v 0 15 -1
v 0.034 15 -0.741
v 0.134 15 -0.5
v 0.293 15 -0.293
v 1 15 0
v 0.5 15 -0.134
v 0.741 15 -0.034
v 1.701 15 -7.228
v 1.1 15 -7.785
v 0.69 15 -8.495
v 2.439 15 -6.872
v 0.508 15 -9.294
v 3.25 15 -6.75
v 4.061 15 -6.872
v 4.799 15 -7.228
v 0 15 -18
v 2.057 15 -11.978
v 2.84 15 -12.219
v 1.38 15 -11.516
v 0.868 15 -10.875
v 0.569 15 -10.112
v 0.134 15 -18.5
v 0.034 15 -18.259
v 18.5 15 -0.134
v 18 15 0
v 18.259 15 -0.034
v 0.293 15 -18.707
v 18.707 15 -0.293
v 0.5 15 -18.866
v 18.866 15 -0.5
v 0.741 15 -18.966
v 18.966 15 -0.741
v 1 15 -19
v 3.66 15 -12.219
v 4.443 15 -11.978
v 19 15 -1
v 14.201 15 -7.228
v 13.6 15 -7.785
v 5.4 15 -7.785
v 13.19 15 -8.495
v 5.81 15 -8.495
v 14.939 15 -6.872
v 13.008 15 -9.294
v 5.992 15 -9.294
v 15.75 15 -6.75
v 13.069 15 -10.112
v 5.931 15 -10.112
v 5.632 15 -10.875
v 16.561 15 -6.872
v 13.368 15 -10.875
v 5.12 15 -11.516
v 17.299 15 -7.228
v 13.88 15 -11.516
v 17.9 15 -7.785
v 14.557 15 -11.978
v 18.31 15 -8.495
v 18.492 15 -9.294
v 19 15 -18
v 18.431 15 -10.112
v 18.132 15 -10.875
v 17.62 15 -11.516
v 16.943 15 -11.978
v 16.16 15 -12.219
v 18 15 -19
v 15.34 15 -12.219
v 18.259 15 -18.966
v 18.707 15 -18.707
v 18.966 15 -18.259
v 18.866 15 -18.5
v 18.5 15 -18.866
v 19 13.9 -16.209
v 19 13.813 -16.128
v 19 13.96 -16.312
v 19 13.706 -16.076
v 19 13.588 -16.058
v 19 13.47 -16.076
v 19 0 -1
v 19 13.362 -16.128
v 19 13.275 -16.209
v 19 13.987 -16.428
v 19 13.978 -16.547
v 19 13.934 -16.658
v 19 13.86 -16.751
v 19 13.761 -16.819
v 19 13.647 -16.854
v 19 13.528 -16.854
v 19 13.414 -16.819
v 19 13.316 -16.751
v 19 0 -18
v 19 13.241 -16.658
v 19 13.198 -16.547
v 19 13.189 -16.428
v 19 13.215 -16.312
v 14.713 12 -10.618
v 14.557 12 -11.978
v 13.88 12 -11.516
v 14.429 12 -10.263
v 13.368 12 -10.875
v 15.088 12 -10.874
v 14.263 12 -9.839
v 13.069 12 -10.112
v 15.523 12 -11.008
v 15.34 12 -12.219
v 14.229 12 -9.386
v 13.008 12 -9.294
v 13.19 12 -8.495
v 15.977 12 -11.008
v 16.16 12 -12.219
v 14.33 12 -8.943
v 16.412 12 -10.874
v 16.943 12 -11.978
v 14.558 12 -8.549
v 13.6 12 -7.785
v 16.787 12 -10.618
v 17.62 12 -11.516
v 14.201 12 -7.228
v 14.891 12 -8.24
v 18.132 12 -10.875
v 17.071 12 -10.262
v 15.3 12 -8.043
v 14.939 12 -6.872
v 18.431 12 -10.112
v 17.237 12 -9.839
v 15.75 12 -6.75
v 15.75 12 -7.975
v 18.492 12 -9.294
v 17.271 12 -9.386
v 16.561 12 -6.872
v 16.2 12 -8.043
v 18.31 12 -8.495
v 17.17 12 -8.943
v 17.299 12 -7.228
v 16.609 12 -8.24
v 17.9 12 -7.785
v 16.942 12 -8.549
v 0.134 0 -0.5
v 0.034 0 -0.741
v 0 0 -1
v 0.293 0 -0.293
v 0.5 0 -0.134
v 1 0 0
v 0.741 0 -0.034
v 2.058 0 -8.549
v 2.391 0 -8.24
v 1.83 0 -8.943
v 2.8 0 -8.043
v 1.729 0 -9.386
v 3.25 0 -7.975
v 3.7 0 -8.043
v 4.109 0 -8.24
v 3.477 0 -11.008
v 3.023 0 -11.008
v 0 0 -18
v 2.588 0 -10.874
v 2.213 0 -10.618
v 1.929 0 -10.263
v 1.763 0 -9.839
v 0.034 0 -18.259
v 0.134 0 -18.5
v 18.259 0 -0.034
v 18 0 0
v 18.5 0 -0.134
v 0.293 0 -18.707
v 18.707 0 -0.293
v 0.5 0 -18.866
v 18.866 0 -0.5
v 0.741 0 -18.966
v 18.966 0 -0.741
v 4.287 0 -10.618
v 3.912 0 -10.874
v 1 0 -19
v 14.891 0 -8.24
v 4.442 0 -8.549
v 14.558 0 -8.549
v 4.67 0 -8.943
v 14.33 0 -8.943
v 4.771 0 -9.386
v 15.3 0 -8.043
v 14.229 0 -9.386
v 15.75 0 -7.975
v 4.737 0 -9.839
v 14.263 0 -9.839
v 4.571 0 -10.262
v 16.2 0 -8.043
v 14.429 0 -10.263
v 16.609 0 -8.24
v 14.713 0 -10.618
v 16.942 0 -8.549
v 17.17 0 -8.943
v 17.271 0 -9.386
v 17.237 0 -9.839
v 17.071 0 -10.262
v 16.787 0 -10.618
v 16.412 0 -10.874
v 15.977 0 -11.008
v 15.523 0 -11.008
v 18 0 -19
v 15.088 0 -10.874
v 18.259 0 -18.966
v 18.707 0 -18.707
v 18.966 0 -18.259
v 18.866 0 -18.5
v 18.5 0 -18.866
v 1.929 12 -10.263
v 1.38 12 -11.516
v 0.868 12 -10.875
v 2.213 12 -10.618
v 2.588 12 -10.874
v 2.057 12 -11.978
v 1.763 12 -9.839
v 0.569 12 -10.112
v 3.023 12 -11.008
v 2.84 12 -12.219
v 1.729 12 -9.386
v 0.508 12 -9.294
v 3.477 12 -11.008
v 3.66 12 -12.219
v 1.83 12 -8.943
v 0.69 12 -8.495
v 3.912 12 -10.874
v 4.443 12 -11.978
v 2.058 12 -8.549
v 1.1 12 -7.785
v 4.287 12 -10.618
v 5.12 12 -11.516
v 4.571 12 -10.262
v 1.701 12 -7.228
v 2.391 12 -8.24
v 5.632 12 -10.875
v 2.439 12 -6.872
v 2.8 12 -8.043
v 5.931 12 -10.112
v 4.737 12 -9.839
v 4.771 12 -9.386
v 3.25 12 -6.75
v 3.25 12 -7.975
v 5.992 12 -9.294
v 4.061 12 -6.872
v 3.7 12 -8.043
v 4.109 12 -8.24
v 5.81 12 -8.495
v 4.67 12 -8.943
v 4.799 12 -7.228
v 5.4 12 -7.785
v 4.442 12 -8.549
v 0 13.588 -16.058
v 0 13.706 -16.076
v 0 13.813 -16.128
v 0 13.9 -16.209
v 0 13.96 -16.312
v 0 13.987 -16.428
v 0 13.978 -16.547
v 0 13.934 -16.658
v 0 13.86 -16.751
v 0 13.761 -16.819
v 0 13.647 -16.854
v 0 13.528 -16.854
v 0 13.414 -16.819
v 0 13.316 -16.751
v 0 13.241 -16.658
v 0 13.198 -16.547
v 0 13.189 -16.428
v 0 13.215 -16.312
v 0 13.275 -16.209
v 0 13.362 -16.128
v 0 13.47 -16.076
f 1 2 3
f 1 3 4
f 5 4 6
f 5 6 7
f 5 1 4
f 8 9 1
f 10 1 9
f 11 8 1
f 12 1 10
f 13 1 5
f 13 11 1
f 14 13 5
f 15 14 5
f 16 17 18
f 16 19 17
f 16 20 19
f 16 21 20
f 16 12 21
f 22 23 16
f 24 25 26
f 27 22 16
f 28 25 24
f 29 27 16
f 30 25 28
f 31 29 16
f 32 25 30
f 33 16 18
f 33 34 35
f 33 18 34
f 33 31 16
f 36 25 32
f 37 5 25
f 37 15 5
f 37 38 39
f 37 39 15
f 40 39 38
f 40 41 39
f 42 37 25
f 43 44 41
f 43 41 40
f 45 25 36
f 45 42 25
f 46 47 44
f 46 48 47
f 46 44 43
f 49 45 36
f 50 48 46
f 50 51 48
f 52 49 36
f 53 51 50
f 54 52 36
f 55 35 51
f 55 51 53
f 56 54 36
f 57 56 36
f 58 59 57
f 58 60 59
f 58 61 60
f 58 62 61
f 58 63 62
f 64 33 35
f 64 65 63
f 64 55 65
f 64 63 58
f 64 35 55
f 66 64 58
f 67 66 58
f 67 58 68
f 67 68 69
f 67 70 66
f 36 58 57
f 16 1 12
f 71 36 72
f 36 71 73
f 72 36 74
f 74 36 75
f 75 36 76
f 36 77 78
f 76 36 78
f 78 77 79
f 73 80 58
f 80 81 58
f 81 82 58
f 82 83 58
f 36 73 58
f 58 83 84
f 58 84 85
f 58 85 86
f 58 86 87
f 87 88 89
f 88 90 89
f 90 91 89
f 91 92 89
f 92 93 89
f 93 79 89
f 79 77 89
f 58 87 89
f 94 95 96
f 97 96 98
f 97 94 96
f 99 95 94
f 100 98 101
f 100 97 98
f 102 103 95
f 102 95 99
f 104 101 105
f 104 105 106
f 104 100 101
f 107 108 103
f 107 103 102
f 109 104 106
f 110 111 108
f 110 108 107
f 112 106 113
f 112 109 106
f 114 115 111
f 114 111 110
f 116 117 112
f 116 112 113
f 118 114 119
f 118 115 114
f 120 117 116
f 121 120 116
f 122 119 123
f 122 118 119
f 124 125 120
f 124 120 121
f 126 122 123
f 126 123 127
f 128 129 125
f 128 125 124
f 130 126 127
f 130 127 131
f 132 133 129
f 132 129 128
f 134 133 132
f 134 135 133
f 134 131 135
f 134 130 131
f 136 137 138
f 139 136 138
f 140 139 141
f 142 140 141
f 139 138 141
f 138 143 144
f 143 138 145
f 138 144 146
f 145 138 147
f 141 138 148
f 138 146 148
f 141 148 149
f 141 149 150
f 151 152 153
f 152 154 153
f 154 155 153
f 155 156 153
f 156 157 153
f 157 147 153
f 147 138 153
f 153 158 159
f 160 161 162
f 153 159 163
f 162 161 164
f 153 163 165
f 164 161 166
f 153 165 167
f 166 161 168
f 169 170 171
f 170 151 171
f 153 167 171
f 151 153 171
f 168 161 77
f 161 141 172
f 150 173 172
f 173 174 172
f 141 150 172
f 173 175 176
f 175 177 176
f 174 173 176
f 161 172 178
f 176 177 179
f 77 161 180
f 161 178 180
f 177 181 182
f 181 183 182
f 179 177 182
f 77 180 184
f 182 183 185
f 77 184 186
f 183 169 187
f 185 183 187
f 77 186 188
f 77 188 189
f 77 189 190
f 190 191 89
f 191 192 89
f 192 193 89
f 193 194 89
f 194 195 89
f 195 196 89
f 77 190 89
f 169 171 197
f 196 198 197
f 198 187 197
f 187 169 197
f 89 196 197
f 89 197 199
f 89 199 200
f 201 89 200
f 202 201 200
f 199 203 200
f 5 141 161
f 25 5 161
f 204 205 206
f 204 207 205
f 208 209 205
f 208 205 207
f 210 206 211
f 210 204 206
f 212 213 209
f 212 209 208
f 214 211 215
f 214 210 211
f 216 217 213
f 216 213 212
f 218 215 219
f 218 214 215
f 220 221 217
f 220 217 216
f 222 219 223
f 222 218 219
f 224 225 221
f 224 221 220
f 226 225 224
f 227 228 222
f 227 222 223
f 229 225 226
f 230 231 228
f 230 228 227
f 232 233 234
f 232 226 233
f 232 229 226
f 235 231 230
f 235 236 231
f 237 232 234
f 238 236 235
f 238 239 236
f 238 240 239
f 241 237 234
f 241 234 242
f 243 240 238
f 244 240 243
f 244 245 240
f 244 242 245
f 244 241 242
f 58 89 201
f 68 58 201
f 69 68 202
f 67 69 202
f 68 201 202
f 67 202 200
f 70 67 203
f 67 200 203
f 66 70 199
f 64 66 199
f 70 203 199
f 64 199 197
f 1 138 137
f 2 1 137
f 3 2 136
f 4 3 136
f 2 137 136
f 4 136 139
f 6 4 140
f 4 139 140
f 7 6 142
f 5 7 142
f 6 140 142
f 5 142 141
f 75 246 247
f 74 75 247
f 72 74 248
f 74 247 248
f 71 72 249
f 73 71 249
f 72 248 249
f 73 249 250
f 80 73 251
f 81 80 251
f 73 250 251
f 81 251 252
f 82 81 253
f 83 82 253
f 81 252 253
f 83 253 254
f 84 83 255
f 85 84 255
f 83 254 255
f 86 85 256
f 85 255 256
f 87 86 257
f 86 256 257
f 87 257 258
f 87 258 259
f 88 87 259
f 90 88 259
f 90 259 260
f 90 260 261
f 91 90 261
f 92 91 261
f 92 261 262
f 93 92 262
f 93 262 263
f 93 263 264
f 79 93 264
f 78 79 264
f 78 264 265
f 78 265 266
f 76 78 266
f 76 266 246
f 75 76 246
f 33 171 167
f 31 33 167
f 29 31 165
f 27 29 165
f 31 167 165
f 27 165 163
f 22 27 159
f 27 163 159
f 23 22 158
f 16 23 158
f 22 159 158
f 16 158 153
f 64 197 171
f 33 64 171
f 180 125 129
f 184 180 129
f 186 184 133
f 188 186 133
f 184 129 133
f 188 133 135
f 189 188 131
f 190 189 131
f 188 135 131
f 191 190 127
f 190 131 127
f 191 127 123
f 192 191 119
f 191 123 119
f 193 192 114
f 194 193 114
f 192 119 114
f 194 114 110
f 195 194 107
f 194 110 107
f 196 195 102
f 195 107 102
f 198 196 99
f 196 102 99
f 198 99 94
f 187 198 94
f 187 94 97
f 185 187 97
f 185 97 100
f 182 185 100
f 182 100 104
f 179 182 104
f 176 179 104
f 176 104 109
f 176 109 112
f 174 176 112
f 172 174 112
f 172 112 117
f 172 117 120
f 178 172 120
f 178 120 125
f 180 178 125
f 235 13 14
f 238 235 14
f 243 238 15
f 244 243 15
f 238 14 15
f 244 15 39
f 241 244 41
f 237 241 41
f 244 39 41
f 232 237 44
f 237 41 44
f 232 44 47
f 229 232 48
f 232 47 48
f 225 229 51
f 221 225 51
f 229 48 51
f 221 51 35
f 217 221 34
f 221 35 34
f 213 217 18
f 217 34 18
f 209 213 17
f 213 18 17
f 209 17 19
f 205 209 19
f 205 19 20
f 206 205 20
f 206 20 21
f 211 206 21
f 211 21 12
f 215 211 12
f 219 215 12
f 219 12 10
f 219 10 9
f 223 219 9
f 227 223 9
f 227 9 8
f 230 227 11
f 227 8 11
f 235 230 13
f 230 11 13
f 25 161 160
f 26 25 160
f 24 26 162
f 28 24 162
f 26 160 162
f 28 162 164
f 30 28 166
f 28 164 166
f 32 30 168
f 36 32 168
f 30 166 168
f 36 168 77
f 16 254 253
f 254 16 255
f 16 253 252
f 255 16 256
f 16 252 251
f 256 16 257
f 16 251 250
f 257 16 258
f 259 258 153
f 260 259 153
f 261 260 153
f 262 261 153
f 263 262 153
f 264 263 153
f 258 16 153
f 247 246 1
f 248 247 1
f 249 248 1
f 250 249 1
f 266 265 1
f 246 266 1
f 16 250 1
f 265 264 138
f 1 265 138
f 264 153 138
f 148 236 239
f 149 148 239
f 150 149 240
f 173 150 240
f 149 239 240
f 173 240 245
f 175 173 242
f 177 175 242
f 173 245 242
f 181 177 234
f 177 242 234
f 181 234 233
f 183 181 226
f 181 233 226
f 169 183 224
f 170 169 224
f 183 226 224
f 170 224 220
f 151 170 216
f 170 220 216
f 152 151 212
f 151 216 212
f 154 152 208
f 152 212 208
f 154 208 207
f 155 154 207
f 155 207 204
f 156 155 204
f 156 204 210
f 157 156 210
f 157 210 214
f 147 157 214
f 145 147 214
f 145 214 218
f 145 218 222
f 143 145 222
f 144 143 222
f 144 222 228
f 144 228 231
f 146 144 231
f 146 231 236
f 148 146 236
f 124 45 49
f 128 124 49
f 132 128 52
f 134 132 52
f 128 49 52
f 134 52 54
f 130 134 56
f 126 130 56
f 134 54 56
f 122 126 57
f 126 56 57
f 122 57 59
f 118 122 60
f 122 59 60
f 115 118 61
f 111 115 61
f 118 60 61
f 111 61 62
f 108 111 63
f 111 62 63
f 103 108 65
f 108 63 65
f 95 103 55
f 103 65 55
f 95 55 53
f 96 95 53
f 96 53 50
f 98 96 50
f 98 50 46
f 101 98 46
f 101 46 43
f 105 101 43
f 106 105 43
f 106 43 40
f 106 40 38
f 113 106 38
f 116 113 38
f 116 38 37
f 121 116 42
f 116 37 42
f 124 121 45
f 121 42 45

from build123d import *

# Parameters (mm, degrees)
BOSS_EXTRUDE1_DEPTH = 15
CUT_EXTRUDE1_REACH  = 32.773
SKETCH2_R           = 1.525
SKETCH3_R           = 2.75
CUT_EXTRUDE2_DEPTH  = 3
CUT_EXTRUDE3_REACH  = 32.773
SKETCH4_R           = 0.4


with BuildPart() as part:
    # Sketch1 → Boss-Extrude1 (new body)
    with BuildSketch(Plane(origin=(0, 0, 0), x_dir=(1, 0, 0), z_dir=(0, 1, 0))):
        with BuildLine():
            Line((1, 0), (18, 0))
            ThreePointArc((18, 0), (18.707106781, 0.292893219), (19, 1))
            Line((19, 1), (19, 18))
            ThreePointArc((19, 18), (18.707106781, 18.707106781), (18, 19))
            Line((18, 19), (1, 19))
            ThreePointArc((1, 19), (0.292893219, 18.707106781), (0, 18))
            Line((0, 18), (0, 1))
            ThreePointArc((0, 1), (0.292893219, 0.292893219), (1, 0))
        make_face()
    extrude(amount=BOSS_EXTRUDE1_DEPTH)

    # Sketch2 → Cut-Extrude1 (cut, up to next)
    with BuildSketch(Plane(origin=(0, 15, 0), x_dir=(1, 0, 0), z_dir=(0, 1, 0)), mode=Mode.PRIVATE) as cut_extrude1_sk1:
        with Locations(Location((3.25, 9.5, 0), (0, 0, 270))):
            Circle(SKETCH2_R)
    cut_extrude1_tool1 = extrude(cut_extrude1_sk1.sketch, amount=-CUT_EXTRUDE1_REACH, mode=Mode.PRIVATE) & part.part
    # Sketch2 → Cut-Extrude1 (cut, up to next)
    with BuildSketch(Plane(origin=(0, 15, 0), x_dir=(1, 0, 0), z_dir=(0, 1, 0)), mode=Mode.PRIVATE) as cut_extrude1_sk2:
        with Locations(Location((15.75, 9.5, 0), (0, 0, 270))):
            Circle(SKETCH2_R)
    cut_extrude1_tool2 = extrude(cut_extrude1_sk2.sketch, amount=-CUT_EXTRUDE1_REACH, mode=Mode.PRIVATE) & part.part
    add(cut_extrude1_tool1.solids().sort_by_distance((3.25, 15, -9.5))[0], mode=Mode.SUBTRACT)
    add(cut_extrude1_tool2.solids().sort_by_distance((15.75, 15, -9.5))[0], mode=Mode.SUBTRACT)

    # Sketch3 → Cut-Extrude2 (cut)
    with BuildSketch(Plane(origin=(0, 15, 0), x_dir=(1, 0, 0), z_dir=(0, 1, 0))):
        with Locations(Location((3.25, 9.5, 0), (0, 0, 270))):
            Circle(SKETCH3_R)
        with Locations(Location((15.75, 9.5, 0), (0, 0, 270))):
            Circle(SKETCH3_R)
    extrude(amount=-CUT_EXTRUDE2_DEPTH, mode=Mode.SUBTRACT)

    # Sketch4 → Cut-Extrude3 (cut, up to next)
    with BuildSketch(Plane.ZY, mode=Mode.PRIVATE) as cut_extrude3_sk1:
        with Locations((-16.458209363, 13.587683821)):
            Circle(SKETCH4_R)
    cut_extrude3_tool1 = extrude(cut_extrude3_sk1.sketch, amount=-CUT_EXTRUDE3_REACH, mode=Mode.PRIVATE) & part.part
    add(cut_extrude3_tool1.solids().sort_by_distance((0, 13.587684, -16.458209))[0], mode=Mode.SUBTRACT)


solid = part.part
